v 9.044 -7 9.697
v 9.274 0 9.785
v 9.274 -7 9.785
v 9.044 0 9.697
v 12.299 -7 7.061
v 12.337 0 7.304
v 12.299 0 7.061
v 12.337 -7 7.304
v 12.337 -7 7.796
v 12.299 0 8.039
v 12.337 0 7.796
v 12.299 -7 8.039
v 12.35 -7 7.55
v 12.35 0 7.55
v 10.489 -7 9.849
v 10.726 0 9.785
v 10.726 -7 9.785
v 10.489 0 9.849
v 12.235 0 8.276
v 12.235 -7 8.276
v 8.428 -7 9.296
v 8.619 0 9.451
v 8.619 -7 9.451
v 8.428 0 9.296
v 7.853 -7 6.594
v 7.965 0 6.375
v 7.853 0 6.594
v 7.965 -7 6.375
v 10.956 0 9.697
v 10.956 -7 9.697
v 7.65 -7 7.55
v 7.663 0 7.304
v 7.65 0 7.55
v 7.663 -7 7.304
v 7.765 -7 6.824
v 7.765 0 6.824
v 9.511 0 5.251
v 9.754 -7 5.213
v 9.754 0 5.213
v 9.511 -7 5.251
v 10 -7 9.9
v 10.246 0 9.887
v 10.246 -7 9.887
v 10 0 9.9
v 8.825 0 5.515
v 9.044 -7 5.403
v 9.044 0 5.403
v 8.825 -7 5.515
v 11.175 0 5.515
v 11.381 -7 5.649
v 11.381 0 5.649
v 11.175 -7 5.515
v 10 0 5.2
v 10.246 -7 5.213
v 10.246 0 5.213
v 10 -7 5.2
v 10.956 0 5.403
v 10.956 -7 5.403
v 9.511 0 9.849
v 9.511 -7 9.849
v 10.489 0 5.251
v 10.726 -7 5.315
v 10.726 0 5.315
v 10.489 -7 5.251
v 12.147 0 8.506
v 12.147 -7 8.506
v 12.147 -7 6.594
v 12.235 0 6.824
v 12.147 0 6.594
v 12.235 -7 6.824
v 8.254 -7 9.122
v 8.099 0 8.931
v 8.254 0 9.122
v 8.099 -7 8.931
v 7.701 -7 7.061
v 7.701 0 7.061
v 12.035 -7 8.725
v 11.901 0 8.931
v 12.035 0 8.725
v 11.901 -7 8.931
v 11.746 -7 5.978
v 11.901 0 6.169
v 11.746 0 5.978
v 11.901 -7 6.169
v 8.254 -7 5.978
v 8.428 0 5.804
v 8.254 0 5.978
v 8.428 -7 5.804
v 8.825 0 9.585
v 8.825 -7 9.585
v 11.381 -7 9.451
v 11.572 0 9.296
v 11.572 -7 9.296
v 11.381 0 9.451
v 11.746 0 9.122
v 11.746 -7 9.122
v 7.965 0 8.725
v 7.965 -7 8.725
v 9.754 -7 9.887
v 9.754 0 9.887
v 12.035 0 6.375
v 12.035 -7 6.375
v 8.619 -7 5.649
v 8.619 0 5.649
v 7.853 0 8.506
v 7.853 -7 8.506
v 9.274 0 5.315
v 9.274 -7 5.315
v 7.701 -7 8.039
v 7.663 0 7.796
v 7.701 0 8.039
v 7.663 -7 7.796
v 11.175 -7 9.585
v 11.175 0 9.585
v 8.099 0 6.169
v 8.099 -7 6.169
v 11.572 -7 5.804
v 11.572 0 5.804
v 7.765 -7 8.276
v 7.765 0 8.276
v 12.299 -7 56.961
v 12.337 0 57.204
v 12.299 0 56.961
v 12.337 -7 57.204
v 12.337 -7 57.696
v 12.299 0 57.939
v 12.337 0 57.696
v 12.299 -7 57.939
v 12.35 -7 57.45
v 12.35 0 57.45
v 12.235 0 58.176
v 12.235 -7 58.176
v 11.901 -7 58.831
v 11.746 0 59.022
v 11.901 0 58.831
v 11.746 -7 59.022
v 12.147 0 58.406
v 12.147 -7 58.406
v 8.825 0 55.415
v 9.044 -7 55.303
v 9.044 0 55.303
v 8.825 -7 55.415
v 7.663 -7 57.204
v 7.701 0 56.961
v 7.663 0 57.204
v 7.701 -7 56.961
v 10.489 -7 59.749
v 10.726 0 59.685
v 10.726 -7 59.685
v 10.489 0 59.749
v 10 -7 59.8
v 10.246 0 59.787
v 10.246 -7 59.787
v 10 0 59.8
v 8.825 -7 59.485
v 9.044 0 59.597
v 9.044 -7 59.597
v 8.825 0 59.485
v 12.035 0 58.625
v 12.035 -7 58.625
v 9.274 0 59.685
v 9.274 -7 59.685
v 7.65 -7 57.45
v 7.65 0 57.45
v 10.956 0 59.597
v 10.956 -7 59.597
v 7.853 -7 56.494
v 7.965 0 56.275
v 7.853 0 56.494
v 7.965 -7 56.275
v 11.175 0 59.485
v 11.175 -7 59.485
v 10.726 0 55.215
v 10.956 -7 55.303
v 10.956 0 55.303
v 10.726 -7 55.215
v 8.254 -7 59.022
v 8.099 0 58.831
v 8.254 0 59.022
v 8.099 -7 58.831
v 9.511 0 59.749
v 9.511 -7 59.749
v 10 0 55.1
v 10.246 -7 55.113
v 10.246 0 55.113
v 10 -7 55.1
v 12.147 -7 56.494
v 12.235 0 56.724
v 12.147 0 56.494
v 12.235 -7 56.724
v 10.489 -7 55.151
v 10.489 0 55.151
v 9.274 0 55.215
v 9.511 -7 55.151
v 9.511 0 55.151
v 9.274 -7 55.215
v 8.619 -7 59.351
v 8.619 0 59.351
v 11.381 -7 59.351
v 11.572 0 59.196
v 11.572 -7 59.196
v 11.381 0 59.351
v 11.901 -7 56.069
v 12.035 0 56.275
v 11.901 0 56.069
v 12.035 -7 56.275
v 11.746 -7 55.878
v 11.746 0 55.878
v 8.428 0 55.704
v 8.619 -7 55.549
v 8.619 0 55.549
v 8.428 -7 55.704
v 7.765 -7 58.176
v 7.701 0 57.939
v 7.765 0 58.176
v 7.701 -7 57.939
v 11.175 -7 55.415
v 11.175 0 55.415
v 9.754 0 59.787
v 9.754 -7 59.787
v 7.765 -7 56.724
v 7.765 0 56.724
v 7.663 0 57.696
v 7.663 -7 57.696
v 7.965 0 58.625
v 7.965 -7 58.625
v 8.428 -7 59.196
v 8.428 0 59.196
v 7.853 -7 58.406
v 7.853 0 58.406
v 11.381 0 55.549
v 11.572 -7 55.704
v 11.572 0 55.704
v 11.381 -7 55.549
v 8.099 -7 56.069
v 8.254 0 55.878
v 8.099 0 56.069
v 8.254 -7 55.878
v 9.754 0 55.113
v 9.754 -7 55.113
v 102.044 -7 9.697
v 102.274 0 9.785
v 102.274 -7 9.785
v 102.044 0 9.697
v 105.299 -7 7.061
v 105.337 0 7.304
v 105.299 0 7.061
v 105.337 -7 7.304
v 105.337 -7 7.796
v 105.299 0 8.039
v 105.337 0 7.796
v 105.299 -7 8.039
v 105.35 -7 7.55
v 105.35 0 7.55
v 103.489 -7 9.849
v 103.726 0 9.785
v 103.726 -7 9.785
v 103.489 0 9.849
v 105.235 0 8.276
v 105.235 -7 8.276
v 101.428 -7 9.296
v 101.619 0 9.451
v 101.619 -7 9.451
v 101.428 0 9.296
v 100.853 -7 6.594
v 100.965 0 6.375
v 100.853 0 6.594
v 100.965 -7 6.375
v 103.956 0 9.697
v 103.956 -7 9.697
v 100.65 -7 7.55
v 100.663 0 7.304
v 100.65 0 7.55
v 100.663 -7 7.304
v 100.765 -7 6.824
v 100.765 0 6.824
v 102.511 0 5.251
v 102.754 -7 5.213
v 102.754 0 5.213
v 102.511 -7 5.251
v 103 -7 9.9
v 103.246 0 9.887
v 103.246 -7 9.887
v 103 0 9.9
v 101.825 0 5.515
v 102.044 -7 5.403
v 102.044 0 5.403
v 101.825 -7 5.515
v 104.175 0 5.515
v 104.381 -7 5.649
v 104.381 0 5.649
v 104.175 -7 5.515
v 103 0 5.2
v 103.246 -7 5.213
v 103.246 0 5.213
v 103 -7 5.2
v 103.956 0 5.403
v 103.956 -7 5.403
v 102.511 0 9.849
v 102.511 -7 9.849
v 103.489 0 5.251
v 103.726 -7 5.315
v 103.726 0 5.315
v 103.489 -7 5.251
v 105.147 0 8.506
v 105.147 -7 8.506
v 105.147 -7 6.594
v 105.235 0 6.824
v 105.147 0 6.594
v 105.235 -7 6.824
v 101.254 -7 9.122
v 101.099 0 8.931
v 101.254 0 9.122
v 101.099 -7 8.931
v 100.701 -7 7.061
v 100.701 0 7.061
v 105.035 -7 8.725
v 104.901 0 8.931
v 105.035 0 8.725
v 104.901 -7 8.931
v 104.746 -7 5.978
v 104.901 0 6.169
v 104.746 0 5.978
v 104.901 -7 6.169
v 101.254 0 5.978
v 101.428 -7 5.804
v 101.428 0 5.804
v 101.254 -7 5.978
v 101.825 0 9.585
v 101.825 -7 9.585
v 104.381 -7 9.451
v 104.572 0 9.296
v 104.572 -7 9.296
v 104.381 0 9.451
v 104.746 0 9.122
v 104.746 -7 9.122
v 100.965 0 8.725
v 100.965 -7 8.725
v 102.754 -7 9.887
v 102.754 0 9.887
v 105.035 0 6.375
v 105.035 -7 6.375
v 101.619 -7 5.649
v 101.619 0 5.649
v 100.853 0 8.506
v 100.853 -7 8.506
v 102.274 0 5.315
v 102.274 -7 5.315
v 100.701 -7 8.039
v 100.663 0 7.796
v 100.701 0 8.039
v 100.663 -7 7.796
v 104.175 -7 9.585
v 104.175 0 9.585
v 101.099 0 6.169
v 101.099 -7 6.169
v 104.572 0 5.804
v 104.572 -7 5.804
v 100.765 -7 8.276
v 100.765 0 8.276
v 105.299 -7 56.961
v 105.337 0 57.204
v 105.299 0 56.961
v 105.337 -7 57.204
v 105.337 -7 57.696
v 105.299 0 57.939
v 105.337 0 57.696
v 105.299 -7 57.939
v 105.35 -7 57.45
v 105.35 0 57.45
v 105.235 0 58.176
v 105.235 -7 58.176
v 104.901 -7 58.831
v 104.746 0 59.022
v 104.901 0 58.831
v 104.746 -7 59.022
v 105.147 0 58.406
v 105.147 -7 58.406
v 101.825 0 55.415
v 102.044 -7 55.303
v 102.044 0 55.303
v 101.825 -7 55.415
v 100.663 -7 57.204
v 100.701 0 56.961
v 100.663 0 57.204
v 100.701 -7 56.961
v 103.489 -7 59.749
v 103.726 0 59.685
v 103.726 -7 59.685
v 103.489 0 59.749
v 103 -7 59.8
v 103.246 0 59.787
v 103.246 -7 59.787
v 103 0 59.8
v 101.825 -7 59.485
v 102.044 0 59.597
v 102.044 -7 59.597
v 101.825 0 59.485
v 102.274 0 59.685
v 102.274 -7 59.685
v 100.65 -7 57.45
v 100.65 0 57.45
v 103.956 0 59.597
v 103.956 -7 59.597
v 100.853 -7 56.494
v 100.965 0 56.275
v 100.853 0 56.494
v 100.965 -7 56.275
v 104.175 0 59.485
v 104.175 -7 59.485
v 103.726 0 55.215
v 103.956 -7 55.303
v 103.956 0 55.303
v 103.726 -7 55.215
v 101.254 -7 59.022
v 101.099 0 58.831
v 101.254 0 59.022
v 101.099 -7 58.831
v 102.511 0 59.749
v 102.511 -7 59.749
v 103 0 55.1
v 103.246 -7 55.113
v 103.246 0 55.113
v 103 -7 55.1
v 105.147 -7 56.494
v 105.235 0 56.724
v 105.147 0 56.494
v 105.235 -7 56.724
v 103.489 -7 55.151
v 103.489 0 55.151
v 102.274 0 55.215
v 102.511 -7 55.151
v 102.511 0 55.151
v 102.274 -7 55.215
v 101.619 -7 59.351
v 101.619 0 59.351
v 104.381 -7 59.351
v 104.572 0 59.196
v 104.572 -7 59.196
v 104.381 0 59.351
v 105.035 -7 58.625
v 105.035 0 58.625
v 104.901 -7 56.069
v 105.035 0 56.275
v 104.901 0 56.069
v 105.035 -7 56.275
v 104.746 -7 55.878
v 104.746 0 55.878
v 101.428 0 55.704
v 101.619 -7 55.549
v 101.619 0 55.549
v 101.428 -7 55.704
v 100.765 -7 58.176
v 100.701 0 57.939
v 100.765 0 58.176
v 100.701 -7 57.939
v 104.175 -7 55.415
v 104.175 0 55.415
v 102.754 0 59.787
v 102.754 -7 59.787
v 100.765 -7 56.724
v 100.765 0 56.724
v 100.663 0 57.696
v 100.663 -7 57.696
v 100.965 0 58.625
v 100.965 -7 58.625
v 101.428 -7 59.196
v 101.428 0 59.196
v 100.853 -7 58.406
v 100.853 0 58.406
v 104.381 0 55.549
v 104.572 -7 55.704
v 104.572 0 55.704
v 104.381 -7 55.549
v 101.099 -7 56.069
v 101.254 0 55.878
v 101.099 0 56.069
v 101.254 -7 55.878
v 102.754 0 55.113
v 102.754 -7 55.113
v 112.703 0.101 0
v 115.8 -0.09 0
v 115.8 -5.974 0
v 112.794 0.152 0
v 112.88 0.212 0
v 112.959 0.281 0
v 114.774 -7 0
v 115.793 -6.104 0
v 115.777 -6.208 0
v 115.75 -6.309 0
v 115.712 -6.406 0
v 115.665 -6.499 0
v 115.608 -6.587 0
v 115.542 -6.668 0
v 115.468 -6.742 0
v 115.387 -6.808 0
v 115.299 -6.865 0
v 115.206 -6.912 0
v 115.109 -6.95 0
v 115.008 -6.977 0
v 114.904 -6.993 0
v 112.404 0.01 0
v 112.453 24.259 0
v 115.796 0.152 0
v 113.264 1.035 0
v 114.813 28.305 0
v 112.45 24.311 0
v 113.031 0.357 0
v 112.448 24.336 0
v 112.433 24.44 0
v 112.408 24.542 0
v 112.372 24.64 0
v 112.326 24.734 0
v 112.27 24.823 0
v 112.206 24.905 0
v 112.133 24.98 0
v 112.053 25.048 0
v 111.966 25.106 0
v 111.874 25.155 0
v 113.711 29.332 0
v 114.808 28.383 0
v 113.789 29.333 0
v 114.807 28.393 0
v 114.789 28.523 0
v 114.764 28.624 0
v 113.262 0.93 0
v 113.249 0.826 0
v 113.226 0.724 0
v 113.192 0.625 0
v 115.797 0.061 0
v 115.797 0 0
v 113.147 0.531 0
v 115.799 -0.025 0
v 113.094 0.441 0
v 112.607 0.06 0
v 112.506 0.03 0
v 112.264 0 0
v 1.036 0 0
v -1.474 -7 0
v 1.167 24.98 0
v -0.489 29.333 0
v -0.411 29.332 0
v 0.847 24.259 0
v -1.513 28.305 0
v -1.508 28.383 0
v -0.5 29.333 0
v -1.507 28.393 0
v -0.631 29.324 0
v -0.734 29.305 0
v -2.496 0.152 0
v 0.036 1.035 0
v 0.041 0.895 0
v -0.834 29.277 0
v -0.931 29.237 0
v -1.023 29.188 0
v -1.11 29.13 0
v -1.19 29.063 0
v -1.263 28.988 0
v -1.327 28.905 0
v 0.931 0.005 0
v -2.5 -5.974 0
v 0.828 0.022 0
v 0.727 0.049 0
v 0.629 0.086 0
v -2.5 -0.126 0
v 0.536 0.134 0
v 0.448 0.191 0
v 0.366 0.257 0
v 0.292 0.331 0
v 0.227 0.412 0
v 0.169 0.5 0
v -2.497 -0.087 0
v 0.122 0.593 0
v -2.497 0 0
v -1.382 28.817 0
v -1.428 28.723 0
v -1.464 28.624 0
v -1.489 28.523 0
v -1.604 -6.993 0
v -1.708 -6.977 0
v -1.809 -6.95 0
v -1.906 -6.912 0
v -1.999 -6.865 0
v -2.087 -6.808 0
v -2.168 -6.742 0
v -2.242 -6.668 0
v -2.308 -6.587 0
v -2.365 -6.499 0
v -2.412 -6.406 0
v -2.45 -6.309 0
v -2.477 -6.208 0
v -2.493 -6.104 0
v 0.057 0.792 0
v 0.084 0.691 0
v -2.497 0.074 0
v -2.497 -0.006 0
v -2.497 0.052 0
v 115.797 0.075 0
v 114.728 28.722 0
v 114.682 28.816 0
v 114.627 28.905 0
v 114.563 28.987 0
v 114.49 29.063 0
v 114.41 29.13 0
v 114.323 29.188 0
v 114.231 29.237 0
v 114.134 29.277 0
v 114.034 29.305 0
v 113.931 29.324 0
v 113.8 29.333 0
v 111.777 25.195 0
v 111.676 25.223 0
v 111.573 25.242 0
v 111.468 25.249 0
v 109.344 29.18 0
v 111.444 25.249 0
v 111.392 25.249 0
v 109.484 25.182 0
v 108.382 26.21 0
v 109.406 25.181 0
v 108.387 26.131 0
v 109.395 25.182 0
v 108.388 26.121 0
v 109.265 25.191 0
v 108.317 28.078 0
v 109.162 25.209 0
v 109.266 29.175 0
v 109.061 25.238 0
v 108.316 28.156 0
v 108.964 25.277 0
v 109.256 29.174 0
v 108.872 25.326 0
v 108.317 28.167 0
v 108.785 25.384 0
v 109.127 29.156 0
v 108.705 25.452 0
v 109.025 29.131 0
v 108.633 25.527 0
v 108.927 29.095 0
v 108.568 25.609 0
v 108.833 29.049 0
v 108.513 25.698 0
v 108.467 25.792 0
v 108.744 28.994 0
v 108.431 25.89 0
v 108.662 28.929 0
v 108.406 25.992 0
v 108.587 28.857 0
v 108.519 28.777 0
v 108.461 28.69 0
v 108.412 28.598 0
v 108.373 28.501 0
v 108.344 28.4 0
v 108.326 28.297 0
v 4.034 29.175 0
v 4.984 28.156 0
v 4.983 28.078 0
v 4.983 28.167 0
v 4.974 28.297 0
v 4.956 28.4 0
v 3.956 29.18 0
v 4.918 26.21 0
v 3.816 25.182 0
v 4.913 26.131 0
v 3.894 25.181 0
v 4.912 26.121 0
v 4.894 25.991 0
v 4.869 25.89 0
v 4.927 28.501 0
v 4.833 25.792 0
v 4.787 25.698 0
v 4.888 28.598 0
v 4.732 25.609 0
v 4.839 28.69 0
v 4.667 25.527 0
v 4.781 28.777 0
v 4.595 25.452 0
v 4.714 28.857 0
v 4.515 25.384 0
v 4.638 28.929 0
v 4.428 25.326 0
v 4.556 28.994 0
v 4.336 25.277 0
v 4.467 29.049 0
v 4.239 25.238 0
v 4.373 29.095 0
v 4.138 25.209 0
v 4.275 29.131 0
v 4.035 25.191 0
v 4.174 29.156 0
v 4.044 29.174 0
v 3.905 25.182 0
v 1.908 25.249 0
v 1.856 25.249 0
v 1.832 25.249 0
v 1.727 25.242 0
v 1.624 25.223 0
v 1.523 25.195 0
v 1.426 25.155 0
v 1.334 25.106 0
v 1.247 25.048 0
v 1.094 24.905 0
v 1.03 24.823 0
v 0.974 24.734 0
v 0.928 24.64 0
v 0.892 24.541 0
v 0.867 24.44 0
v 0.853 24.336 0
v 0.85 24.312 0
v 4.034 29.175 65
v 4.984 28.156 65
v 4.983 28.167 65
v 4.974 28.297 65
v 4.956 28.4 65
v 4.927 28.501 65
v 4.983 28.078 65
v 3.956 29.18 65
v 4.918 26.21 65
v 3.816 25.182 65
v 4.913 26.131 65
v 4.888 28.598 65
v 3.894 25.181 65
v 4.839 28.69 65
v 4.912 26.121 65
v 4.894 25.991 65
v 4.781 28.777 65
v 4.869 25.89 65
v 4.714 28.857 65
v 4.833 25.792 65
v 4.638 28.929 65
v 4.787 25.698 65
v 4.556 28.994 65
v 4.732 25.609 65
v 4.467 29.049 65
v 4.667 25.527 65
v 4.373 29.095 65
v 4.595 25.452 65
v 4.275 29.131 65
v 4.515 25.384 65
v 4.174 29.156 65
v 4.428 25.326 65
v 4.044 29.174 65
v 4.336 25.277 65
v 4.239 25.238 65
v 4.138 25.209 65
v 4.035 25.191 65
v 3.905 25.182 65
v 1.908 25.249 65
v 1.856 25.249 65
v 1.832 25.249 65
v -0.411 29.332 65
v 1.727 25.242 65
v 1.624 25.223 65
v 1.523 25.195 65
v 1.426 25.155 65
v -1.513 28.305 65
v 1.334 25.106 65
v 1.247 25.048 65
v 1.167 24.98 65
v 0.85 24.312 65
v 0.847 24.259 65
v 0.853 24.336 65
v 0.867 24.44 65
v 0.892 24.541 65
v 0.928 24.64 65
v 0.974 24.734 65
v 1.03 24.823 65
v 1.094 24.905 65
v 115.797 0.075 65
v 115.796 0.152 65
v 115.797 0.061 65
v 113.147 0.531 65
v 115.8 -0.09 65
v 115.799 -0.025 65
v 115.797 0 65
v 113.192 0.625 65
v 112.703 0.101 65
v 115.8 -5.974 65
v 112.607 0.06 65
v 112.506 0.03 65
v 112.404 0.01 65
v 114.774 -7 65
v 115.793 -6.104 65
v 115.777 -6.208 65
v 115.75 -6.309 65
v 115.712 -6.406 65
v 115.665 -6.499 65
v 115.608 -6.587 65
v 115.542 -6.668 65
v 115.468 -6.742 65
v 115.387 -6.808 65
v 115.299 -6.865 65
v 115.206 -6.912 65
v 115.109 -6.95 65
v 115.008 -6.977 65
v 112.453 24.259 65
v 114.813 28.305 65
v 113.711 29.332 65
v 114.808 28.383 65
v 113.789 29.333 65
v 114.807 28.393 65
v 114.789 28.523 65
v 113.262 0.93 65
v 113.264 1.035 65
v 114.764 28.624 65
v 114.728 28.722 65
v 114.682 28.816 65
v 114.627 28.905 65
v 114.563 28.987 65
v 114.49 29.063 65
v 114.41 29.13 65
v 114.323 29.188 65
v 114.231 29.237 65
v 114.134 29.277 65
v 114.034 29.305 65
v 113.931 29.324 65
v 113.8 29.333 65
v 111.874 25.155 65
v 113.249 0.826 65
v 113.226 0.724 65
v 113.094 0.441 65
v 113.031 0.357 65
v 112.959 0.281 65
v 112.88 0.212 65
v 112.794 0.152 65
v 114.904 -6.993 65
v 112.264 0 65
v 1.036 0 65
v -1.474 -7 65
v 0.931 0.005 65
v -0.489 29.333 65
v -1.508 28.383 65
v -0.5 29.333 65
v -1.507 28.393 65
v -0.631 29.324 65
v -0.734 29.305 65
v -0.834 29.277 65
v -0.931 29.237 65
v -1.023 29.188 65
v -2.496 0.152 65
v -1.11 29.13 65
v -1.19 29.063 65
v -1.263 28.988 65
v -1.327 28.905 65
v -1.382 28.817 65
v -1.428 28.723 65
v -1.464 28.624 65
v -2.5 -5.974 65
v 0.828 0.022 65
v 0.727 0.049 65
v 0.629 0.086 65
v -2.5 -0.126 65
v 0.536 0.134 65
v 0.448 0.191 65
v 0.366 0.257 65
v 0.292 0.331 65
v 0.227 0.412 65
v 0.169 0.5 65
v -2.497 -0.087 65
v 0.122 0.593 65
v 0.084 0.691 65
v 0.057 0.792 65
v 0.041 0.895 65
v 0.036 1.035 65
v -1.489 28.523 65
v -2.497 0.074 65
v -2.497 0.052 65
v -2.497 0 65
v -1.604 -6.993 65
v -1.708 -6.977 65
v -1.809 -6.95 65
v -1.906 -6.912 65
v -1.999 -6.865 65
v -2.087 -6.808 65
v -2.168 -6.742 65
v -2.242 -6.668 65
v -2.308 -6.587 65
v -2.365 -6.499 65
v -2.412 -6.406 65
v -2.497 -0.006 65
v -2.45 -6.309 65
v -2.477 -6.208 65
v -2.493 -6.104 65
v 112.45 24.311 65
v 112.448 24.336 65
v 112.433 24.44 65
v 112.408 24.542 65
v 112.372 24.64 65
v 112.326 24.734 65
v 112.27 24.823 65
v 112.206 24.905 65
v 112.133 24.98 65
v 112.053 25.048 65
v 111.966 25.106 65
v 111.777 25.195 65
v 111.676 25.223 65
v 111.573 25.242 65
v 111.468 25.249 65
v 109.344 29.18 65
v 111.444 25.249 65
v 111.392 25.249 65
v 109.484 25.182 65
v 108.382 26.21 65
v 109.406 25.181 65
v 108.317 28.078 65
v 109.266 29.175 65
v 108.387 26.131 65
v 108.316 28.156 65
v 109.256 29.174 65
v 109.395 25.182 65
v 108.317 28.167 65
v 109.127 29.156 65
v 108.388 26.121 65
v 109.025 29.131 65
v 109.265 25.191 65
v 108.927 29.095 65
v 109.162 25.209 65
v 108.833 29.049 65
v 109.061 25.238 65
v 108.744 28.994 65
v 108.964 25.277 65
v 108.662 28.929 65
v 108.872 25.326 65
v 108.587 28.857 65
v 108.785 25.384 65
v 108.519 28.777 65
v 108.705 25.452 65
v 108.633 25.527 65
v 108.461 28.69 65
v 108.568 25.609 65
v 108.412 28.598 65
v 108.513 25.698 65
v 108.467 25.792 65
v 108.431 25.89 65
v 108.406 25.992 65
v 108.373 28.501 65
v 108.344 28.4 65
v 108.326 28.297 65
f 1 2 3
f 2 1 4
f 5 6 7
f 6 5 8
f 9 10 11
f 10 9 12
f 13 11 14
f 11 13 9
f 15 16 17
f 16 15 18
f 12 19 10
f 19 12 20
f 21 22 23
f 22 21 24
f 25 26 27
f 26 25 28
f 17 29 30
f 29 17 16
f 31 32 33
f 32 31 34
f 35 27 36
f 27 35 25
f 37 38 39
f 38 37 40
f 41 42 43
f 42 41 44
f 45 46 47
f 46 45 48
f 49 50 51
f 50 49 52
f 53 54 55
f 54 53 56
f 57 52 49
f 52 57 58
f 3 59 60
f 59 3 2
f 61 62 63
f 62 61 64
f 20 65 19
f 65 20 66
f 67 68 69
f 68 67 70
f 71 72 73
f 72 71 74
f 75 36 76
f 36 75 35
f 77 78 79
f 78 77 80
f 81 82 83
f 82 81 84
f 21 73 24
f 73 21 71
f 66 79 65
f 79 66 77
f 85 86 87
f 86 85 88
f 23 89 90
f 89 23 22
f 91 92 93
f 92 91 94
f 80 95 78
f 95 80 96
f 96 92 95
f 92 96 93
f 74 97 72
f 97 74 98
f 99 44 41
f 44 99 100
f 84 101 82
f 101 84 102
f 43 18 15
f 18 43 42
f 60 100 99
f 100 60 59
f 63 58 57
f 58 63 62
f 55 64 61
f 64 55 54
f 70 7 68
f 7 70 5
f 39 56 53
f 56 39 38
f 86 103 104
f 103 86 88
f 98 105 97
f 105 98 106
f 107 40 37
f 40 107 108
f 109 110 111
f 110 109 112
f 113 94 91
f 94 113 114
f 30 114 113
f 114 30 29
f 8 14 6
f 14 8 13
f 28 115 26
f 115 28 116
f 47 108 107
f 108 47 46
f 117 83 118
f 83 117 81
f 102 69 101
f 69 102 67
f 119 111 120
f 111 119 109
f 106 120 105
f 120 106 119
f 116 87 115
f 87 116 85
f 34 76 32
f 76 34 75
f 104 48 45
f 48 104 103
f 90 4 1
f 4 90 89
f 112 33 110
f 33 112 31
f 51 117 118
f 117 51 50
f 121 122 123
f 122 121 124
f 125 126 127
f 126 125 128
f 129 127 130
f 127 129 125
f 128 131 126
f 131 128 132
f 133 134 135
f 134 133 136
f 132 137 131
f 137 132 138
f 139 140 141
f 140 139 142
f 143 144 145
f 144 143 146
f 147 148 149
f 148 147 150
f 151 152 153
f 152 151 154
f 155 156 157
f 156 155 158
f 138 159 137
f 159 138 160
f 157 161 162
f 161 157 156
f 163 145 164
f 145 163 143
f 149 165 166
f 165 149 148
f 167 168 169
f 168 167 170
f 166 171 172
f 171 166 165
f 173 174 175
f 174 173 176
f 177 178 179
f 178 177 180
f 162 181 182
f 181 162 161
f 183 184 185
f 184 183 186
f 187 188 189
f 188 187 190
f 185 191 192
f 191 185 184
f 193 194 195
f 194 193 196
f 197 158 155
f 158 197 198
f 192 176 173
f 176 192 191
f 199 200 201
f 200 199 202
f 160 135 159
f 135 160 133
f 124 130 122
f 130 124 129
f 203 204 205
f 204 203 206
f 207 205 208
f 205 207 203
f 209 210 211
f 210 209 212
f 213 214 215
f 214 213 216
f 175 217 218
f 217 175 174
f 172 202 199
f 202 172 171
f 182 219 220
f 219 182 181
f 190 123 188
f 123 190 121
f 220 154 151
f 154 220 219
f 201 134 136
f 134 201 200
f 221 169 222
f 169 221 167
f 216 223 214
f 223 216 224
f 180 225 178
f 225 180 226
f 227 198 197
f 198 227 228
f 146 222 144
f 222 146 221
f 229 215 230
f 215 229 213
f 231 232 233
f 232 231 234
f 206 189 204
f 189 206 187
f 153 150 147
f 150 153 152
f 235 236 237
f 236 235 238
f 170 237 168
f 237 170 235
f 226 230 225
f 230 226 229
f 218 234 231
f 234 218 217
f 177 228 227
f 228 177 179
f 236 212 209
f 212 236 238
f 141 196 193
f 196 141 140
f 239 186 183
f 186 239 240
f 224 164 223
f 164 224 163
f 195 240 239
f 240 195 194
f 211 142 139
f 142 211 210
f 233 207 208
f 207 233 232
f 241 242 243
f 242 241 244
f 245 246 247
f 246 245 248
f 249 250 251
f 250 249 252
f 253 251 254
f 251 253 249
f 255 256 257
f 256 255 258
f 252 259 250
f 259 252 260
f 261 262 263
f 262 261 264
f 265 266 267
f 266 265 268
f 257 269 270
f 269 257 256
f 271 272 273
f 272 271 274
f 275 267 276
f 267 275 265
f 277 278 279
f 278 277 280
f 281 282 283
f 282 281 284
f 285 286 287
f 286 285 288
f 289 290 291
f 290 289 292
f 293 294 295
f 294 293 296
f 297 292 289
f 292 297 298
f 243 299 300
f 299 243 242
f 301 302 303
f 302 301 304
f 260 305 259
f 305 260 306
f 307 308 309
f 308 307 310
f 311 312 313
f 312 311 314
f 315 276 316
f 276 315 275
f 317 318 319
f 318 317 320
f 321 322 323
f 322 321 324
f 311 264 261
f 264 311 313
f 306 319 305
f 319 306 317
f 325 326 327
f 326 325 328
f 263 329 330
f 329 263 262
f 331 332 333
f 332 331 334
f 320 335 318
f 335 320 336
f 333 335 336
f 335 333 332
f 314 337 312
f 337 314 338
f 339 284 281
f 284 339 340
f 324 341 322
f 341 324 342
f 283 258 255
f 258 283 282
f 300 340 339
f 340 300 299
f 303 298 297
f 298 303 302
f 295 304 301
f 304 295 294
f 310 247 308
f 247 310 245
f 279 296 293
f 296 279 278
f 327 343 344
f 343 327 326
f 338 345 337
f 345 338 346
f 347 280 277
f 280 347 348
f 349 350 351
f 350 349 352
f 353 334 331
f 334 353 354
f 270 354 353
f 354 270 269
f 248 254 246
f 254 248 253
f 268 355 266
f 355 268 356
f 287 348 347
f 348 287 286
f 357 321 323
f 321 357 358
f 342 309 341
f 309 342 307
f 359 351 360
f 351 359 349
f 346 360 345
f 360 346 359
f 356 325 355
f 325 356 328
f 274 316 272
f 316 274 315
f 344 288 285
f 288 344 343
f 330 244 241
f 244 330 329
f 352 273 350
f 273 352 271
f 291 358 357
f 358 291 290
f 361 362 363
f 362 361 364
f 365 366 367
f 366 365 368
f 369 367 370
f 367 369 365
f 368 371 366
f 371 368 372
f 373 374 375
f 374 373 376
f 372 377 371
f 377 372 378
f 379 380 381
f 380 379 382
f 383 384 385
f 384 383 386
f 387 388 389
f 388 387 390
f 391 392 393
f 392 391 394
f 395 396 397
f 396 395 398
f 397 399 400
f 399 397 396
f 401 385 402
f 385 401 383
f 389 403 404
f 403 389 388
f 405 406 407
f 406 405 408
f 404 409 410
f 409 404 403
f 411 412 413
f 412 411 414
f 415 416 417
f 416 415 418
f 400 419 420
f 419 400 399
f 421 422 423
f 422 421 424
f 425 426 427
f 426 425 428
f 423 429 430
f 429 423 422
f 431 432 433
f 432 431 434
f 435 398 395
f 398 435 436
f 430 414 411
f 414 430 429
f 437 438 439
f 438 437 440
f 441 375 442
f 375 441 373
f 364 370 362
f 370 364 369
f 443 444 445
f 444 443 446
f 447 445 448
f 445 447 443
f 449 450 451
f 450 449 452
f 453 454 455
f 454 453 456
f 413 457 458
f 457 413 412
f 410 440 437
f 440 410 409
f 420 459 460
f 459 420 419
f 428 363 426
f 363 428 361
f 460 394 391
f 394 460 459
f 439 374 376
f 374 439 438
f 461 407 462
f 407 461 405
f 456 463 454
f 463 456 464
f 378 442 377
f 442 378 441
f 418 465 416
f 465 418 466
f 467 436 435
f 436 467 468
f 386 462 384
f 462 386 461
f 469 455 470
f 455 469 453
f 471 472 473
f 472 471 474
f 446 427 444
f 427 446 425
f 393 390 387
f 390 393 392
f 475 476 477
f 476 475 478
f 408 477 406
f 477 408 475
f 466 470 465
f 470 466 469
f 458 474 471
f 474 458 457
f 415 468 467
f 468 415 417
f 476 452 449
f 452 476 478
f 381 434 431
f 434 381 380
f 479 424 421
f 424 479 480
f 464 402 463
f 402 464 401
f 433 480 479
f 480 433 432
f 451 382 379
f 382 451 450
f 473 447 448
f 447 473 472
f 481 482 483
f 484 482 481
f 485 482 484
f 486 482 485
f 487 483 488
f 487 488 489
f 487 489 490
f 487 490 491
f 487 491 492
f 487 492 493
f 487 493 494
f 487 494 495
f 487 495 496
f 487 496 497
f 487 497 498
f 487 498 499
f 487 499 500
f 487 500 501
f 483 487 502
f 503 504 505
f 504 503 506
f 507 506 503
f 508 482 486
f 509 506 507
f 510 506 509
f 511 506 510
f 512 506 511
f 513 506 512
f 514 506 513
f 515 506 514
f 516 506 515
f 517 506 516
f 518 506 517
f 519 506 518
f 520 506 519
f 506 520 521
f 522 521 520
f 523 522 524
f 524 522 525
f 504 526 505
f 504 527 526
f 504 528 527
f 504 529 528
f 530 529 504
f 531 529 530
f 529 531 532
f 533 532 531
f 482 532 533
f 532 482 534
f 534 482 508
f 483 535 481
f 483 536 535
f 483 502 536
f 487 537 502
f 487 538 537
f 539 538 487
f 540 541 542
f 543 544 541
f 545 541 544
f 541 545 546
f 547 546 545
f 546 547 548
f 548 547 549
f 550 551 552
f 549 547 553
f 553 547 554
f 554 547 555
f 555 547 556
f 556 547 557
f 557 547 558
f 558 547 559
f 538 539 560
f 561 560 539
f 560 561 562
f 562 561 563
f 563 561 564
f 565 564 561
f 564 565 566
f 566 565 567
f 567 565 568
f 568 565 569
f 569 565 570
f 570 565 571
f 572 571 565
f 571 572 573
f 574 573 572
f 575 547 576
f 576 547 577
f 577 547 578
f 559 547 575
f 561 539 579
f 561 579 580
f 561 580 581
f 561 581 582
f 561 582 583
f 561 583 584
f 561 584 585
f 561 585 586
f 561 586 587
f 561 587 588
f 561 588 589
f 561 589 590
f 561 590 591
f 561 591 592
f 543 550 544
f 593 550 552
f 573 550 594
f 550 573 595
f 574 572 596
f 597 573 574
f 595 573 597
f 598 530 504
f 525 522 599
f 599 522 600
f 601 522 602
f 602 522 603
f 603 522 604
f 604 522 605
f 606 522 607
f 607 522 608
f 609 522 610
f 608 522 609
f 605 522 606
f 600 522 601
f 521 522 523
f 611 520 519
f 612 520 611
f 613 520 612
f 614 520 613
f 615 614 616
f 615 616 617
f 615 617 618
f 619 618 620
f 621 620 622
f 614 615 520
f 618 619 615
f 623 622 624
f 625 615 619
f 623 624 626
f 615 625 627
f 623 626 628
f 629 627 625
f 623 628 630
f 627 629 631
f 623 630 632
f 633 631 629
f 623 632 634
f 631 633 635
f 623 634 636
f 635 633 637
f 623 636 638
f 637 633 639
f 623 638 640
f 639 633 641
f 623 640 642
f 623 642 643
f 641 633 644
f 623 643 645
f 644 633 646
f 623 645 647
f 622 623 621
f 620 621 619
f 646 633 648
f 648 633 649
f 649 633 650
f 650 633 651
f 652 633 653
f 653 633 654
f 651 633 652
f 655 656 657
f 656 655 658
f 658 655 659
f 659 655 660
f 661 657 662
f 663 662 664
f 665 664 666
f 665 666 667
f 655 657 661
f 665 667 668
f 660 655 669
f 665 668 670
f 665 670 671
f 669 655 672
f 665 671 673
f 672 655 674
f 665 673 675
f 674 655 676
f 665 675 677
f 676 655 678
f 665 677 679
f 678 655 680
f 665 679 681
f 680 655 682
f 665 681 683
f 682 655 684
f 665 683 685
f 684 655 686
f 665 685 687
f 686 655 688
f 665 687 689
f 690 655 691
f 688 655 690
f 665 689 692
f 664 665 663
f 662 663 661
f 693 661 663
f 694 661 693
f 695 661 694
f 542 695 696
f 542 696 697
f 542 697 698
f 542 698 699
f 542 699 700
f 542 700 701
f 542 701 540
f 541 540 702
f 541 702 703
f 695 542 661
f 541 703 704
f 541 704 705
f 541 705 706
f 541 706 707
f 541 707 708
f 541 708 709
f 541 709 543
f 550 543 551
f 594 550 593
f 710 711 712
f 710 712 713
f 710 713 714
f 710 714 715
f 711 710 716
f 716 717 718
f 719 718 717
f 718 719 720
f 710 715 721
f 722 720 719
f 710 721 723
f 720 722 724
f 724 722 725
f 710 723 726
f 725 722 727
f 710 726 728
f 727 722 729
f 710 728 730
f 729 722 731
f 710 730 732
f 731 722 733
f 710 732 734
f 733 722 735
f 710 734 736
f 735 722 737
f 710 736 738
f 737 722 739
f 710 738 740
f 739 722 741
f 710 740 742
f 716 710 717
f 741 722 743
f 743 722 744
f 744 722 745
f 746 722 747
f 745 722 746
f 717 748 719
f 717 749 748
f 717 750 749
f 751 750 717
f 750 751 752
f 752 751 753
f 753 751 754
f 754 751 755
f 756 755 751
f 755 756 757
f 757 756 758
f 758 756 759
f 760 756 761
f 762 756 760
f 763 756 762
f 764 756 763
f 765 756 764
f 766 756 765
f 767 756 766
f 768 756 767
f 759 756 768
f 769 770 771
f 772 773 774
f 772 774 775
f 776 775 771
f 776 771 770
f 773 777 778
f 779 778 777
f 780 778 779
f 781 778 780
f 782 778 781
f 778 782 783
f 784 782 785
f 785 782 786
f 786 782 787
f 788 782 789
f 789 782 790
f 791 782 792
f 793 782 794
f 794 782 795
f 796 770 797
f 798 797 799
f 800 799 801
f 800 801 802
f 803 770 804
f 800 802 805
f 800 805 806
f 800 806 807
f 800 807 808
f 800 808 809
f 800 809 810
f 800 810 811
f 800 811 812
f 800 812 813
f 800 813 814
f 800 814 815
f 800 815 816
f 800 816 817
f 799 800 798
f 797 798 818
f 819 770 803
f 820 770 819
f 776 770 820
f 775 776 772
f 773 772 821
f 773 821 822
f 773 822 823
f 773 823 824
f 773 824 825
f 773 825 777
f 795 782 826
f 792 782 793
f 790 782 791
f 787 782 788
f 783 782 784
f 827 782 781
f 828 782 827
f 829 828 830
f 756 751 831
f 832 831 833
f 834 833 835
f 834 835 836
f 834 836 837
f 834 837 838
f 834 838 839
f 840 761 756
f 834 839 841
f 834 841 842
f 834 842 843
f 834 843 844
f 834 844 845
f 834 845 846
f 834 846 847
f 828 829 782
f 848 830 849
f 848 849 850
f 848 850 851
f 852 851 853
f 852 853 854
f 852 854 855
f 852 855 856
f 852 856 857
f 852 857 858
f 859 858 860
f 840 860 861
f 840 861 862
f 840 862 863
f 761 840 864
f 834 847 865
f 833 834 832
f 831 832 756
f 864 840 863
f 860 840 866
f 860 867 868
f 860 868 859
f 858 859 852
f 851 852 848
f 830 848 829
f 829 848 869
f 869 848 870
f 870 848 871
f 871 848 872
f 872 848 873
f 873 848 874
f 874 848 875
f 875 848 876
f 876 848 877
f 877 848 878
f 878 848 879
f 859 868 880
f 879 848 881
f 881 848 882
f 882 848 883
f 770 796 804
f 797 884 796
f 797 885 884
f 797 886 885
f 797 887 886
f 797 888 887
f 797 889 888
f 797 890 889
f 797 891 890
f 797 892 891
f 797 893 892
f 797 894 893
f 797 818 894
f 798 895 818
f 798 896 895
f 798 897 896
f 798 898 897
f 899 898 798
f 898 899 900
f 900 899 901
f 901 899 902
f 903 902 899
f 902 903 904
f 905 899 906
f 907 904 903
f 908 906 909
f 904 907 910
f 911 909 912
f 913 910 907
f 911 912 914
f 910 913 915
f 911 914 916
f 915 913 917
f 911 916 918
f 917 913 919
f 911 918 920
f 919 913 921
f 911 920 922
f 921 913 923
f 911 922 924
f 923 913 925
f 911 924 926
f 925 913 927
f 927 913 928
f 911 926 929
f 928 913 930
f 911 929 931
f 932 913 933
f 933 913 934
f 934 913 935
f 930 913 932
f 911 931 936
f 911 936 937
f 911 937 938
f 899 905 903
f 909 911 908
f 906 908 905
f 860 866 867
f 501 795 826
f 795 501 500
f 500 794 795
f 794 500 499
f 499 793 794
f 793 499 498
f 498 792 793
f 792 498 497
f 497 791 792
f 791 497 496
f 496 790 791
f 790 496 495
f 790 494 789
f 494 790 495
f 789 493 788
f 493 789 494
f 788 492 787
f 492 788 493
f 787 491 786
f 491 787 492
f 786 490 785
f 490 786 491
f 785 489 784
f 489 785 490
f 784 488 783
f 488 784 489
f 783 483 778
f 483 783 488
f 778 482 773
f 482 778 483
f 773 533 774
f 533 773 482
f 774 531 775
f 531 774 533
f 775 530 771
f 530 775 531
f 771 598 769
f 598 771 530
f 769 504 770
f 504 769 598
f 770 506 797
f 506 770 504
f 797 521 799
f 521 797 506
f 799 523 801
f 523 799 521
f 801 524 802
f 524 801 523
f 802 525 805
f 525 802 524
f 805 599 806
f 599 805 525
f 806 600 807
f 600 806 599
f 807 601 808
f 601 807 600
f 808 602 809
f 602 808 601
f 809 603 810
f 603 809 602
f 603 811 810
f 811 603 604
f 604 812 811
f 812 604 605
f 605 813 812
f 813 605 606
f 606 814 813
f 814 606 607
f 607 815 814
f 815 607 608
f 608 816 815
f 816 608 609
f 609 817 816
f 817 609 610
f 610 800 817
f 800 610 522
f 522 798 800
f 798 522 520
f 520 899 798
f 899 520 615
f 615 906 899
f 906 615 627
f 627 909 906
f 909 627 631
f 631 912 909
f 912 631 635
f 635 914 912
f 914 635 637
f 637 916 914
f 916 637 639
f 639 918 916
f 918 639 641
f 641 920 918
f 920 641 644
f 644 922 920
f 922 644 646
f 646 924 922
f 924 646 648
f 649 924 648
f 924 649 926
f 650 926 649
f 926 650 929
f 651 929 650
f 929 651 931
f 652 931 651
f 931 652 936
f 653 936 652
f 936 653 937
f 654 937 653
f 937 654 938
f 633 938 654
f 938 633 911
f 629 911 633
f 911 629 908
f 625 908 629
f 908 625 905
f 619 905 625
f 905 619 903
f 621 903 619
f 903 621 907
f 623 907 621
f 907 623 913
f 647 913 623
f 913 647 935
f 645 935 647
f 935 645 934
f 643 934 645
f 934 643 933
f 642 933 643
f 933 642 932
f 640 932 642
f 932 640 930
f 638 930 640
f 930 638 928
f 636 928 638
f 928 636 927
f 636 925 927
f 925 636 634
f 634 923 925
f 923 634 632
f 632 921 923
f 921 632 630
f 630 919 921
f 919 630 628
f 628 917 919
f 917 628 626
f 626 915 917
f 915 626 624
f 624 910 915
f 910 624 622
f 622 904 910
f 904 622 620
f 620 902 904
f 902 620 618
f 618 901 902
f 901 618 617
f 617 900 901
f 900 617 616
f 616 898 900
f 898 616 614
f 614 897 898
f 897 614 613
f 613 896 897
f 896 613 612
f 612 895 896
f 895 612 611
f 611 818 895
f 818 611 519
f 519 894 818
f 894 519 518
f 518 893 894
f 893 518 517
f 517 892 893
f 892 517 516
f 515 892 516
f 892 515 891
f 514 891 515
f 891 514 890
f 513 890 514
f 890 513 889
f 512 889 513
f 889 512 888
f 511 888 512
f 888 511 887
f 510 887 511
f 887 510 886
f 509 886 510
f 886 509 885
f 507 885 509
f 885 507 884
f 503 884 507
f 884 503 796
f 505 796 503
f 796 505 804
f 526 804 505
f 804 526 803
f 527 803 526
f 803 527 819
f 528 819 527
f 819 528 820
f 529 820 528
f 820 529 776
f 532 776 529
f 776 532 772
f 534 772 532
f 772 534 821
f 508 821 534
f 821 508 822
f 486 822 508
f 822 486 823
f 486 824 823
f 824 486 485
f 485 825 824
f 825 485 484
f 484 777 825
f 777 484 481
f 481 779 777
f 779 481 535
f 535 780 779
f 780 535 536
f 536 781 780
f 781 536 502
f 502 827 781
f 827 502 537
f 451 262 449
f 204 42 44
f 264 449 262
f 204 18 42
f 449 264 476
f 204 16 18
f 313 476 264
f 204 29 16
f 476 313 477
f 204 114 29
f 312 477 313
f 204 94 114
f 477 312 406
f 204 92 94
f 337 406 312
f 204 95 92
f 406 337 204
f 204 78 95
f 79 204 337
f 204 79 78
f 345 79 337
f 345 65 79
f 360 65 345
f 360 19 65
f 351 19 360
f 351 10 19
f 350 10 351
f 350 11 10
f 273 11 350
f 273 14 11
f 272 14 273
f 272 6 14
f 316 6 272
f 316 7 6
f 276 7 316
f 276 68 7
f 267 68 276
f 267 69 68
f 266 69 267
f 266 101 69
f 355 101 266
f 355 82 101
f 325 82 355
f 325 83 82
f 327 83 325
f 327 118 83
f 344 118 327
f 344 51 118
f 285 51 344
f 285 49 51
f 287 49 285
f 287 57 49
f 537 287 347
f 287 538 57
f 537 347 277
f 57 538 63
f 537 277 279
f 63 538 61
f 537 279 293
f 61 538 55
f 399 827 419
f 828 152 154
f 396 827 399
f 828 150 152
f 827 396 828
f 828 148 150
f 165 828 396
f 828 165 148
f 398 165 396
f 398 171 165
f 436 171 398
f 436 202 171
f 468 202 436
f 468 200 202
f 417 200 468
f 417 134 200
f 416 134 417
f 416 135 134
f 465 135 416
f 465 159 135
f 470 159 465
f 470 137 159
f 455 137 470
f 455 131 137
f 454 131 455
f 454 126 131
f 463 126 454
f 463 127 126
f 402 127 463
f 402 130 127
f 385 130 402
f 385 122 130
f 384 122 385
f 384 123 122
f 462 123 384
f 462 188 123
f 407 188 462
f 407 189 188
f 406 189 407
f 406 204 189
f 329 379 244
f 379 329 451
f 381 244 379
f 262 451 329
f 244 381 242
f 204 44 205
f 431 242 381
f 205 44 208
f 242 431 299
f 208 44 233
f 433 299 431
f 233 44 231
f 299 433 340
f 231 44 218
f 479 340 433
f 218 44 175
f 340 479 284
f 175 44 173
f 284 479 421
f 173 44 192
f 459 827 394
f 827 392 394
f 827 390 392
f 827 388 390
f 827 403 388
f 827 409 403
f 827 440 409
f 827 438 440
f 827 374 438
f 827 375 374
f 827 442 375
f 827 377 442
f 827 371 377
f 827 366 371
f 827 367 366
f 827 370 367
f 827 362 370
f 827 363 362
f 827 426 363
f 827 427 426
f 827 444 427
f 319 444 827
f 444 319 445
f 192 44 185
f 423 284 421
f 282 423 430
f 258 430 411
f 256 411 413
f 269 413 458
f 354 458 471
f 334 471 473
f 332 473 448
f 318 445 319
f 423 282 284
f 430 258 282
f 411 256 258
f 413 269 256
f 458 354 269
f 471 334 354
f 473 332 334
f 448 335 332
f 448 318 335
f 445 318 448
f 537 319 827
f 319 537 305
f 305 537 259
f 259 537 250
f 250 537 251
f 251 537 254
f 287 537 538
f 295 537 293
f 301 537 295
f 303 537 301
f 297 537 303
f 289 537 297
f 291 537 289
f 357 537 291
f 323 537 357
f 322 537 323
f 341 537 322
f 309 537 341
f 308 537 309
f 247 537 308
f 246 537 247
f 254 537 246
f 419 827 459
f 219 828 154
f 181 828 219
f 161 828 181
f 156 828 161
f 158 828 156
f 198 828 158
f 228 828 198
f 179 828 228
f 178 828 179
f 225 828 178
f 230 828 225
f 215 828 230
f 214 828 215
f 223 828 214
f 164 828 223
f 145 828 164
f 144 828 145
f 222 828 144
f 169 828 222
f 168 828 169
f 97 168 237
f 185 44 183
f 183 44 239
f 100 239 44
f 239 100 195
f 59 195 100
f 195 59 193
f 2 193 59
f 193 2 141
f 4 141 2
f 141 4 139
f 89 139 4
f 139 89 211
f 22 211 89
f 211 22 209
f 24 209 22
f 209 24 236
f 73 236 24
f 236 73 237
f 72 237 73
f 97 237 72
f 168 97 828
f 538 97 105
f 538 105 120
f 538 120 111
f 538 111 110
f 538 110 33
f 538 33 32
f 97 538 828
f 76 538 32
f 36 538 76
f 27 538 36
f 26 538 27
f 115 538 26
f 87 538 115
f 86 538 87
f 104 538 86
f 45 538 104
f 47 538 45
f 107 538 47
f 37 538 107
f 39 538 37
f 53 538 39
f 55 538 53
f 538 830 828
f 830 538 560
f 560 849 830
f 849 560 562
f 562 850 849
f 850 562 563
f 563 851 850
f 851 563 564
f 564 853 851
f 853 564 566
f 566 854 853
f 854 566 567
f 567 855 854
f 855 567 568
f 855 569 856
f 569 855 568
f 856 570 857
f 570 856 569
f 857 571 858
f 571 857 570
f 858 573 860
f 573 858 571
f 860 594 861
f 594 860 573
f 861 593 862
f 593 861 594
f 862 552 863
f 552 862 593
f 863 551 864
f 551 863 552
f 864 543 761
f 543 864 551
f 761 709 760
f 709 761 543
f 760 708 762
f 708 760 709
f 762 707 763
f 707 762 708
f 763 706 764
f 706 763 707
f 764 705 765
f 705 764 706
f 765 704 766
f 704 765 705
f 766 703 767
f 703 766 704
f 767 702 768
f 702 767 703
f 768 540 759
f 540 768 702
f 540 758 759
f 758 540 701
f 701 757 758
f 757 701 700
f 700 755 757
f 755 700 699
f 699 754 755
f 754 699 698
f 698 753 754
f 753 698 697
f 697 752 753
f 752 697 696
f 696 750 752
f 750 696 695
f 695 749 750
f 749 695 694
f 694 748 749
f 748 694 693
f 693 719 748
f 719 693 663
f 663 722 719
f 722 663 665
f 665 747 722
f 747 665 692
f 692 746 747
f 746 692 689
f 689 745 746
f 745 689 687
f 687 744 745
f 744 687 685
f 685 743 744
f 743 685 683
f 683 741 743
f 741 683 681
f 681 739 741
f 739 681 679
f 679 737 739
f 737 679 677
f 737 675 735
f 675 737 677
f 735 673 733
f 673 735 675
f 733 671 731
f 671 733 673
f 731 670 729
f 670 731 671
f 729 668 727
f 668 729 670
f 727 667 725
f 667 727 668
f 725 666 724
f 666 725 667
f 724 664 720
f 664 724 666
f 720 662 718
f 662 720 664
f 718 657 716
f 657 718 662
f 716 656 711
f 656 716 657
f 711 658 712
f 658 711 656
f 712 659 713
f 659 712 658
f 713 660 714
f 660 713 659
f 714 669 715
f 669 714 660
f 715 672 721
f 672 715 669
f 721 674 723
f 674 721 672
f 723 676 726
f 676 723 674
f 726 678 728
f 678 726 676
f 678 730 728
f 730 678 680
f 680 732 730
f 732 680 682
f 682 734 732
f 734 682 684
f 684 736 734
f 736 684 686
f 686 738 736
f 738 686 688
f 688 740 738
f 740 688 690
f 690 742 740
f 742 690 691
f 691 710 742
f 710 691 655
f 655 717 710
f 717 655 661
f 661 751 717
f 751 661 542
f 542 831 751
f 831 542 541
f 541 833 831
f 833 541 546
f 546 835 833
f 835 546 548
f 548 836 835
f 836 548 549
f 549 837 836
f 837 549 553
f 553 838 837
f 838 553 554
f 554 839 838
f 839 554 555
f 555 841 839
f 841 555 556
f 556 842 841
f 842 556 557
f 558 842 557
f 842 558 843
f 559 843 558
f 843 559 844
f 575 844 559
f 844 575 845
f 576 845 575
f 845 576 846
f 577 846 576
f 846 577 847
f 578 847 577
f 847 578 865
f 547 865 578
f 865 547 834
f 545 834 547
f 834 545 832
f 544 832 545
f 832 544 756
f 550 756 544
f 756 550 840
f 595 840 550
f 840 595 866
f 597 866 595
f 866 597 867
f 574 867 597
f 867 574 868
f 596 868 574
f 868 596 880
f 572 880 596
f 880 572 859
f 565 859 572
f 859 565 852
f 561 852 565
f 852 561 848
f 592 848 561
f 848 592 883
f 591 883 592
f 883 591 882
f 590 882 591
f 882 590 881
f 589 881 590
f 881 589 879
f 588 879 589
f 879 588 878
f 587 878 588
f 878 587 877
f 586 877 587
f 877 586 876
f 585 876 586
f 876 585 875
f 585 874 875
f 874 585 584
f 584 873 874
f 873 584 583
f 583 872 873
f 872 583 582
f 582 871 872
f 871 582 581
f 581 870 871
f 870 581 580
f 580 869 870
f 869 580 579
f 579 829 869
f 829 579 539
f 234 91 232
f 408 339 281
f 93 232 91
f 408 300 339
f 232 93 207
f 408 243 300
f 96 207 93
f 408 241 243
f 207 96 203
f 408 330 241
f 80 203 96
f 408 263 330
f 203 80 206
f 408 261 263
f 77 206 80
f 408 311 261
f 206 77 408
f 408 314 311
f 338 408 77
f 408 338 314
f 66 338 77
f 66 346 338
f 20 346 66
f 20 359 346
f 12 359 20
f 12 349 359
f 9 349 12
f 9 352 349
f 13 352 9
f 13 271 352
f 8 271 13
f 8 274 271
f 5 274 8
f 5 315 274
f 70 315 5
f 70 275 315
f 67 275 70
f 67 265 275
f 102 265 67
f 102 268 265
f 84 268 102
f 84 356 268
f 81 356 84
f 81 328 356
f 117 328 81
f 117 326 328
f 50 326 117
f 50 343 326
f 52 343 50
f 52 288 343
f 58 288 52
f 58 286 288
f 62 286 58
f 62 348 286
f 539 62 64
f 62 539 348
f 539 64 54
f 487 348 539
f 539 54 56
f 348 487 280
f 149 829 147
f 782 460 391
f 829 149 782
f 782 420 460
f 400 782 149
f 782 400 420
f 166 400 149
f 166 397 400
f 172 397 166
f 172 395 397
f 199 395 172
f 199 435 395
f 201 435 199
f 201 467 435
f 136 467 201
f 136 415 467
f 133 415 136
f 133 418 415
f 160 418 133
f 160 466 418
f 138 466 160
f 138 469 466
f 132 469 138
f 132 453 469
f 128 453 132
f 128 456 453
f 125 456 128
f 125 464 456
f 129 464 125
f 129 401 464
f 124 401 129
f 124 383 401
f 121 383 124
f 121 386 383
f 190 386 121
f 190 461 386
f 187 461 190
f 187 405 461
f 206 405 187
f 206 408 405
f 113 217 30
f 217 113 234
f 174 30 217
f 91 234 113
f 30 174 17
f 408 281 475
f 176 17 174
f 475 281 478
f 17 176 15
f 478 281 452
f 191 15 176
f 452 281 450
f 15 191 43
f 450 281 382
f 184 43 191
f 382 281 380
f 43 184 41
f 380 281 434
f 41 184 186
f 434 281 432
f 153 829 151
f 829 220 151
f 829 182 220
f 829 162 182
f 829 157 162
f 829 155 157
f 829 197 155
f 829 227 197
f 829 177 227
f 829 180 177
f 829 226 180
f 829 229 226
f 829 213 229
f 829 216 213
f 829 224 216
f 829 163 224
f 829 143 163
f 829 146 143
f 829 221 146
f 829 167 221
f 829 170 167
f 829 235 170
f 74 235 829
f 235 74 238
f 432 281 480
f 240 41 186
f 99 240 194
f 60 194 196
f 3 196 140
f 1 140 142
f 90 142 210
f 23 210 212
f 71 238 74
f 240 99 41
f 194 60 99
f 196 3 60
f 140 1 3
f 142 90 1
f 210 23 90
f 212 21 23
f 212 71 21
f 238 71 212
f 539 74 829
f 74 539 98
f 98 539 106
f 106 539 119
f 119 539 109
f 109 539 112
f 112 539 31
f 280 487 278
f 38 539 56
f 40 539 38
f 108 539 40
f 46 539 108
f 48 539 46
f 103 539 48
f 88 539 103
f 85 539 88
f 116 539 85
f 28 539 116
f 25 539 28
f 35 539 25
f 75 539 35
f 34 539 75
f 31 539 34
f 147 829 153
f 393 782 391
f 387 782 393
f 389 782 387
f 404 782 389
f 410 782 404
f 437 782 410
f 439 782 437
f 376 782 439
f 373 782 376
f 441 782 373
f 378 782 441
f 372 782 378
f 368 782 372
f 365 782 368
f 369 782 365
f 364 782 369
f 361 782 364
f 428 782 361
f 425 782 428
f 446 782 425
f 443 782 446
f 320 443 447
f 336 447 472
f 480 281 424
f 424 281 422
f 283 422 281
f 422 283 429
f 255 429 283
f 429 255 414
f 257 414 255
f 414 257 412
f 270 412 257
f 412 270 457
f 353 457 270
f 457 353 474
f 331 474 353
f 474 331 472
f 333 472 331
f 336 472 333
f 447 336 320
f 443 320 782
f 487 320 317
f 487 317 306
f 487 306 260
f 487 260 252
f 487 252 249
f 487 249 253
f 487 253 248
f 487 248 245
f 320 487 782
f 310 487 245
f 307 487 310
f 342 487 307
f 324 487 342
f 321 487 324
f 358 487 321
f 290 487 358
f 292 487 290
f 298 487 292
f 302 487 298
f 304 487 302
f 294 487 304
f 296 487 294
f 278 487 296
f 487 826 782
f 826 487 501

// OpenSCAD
// Surface mount TSW010

x = 113;
y = 65;
z = 25;
r = 3;
wall = 2.5;
lip = 4;
a = 2;

extra = 0.3;

plate_thickness = 7;

dia = 4.7;

$fn = 60;

%linear_extrude(y) Model();

difference() {
    linear_extrude(y) offset(-1) offset(2) offset(-1) {
            // Fixed end
            rotate(-a) Clip();

            // Other end
            translate([x+extra,0]) rotate(a) mirror([1,0]) Clip();
            
            // Plate
            translate([-wall, -plate_thickness]) square([wall+ x + extra + wall, plate_thickness]);
    }

    // Fixings
    edge = 10;
    for (mx = [edge, x-edge]) for (my = [edge-4.9/2, y-edge+4.9/2])
        translate([mx,0.001,my]) rotate([90,0,0]) cylinder(d=dia,h=plate_thickness+0.002);}



module Model() {
    offset(r/2) offset(-r/2) square([x,z]);
}

module Clip() {
    offset(-1) offset(2) offset(-1) union() {
        // Lip
        translate([-wall, z + extra]) square([lip+wall, lip]);
        // Side
        translate([-wall, -1]) square([wall, z+extra+1]);
    }
//            translate([-wall,-wall]) square([wall + lip, wall + z + wall]);
}
